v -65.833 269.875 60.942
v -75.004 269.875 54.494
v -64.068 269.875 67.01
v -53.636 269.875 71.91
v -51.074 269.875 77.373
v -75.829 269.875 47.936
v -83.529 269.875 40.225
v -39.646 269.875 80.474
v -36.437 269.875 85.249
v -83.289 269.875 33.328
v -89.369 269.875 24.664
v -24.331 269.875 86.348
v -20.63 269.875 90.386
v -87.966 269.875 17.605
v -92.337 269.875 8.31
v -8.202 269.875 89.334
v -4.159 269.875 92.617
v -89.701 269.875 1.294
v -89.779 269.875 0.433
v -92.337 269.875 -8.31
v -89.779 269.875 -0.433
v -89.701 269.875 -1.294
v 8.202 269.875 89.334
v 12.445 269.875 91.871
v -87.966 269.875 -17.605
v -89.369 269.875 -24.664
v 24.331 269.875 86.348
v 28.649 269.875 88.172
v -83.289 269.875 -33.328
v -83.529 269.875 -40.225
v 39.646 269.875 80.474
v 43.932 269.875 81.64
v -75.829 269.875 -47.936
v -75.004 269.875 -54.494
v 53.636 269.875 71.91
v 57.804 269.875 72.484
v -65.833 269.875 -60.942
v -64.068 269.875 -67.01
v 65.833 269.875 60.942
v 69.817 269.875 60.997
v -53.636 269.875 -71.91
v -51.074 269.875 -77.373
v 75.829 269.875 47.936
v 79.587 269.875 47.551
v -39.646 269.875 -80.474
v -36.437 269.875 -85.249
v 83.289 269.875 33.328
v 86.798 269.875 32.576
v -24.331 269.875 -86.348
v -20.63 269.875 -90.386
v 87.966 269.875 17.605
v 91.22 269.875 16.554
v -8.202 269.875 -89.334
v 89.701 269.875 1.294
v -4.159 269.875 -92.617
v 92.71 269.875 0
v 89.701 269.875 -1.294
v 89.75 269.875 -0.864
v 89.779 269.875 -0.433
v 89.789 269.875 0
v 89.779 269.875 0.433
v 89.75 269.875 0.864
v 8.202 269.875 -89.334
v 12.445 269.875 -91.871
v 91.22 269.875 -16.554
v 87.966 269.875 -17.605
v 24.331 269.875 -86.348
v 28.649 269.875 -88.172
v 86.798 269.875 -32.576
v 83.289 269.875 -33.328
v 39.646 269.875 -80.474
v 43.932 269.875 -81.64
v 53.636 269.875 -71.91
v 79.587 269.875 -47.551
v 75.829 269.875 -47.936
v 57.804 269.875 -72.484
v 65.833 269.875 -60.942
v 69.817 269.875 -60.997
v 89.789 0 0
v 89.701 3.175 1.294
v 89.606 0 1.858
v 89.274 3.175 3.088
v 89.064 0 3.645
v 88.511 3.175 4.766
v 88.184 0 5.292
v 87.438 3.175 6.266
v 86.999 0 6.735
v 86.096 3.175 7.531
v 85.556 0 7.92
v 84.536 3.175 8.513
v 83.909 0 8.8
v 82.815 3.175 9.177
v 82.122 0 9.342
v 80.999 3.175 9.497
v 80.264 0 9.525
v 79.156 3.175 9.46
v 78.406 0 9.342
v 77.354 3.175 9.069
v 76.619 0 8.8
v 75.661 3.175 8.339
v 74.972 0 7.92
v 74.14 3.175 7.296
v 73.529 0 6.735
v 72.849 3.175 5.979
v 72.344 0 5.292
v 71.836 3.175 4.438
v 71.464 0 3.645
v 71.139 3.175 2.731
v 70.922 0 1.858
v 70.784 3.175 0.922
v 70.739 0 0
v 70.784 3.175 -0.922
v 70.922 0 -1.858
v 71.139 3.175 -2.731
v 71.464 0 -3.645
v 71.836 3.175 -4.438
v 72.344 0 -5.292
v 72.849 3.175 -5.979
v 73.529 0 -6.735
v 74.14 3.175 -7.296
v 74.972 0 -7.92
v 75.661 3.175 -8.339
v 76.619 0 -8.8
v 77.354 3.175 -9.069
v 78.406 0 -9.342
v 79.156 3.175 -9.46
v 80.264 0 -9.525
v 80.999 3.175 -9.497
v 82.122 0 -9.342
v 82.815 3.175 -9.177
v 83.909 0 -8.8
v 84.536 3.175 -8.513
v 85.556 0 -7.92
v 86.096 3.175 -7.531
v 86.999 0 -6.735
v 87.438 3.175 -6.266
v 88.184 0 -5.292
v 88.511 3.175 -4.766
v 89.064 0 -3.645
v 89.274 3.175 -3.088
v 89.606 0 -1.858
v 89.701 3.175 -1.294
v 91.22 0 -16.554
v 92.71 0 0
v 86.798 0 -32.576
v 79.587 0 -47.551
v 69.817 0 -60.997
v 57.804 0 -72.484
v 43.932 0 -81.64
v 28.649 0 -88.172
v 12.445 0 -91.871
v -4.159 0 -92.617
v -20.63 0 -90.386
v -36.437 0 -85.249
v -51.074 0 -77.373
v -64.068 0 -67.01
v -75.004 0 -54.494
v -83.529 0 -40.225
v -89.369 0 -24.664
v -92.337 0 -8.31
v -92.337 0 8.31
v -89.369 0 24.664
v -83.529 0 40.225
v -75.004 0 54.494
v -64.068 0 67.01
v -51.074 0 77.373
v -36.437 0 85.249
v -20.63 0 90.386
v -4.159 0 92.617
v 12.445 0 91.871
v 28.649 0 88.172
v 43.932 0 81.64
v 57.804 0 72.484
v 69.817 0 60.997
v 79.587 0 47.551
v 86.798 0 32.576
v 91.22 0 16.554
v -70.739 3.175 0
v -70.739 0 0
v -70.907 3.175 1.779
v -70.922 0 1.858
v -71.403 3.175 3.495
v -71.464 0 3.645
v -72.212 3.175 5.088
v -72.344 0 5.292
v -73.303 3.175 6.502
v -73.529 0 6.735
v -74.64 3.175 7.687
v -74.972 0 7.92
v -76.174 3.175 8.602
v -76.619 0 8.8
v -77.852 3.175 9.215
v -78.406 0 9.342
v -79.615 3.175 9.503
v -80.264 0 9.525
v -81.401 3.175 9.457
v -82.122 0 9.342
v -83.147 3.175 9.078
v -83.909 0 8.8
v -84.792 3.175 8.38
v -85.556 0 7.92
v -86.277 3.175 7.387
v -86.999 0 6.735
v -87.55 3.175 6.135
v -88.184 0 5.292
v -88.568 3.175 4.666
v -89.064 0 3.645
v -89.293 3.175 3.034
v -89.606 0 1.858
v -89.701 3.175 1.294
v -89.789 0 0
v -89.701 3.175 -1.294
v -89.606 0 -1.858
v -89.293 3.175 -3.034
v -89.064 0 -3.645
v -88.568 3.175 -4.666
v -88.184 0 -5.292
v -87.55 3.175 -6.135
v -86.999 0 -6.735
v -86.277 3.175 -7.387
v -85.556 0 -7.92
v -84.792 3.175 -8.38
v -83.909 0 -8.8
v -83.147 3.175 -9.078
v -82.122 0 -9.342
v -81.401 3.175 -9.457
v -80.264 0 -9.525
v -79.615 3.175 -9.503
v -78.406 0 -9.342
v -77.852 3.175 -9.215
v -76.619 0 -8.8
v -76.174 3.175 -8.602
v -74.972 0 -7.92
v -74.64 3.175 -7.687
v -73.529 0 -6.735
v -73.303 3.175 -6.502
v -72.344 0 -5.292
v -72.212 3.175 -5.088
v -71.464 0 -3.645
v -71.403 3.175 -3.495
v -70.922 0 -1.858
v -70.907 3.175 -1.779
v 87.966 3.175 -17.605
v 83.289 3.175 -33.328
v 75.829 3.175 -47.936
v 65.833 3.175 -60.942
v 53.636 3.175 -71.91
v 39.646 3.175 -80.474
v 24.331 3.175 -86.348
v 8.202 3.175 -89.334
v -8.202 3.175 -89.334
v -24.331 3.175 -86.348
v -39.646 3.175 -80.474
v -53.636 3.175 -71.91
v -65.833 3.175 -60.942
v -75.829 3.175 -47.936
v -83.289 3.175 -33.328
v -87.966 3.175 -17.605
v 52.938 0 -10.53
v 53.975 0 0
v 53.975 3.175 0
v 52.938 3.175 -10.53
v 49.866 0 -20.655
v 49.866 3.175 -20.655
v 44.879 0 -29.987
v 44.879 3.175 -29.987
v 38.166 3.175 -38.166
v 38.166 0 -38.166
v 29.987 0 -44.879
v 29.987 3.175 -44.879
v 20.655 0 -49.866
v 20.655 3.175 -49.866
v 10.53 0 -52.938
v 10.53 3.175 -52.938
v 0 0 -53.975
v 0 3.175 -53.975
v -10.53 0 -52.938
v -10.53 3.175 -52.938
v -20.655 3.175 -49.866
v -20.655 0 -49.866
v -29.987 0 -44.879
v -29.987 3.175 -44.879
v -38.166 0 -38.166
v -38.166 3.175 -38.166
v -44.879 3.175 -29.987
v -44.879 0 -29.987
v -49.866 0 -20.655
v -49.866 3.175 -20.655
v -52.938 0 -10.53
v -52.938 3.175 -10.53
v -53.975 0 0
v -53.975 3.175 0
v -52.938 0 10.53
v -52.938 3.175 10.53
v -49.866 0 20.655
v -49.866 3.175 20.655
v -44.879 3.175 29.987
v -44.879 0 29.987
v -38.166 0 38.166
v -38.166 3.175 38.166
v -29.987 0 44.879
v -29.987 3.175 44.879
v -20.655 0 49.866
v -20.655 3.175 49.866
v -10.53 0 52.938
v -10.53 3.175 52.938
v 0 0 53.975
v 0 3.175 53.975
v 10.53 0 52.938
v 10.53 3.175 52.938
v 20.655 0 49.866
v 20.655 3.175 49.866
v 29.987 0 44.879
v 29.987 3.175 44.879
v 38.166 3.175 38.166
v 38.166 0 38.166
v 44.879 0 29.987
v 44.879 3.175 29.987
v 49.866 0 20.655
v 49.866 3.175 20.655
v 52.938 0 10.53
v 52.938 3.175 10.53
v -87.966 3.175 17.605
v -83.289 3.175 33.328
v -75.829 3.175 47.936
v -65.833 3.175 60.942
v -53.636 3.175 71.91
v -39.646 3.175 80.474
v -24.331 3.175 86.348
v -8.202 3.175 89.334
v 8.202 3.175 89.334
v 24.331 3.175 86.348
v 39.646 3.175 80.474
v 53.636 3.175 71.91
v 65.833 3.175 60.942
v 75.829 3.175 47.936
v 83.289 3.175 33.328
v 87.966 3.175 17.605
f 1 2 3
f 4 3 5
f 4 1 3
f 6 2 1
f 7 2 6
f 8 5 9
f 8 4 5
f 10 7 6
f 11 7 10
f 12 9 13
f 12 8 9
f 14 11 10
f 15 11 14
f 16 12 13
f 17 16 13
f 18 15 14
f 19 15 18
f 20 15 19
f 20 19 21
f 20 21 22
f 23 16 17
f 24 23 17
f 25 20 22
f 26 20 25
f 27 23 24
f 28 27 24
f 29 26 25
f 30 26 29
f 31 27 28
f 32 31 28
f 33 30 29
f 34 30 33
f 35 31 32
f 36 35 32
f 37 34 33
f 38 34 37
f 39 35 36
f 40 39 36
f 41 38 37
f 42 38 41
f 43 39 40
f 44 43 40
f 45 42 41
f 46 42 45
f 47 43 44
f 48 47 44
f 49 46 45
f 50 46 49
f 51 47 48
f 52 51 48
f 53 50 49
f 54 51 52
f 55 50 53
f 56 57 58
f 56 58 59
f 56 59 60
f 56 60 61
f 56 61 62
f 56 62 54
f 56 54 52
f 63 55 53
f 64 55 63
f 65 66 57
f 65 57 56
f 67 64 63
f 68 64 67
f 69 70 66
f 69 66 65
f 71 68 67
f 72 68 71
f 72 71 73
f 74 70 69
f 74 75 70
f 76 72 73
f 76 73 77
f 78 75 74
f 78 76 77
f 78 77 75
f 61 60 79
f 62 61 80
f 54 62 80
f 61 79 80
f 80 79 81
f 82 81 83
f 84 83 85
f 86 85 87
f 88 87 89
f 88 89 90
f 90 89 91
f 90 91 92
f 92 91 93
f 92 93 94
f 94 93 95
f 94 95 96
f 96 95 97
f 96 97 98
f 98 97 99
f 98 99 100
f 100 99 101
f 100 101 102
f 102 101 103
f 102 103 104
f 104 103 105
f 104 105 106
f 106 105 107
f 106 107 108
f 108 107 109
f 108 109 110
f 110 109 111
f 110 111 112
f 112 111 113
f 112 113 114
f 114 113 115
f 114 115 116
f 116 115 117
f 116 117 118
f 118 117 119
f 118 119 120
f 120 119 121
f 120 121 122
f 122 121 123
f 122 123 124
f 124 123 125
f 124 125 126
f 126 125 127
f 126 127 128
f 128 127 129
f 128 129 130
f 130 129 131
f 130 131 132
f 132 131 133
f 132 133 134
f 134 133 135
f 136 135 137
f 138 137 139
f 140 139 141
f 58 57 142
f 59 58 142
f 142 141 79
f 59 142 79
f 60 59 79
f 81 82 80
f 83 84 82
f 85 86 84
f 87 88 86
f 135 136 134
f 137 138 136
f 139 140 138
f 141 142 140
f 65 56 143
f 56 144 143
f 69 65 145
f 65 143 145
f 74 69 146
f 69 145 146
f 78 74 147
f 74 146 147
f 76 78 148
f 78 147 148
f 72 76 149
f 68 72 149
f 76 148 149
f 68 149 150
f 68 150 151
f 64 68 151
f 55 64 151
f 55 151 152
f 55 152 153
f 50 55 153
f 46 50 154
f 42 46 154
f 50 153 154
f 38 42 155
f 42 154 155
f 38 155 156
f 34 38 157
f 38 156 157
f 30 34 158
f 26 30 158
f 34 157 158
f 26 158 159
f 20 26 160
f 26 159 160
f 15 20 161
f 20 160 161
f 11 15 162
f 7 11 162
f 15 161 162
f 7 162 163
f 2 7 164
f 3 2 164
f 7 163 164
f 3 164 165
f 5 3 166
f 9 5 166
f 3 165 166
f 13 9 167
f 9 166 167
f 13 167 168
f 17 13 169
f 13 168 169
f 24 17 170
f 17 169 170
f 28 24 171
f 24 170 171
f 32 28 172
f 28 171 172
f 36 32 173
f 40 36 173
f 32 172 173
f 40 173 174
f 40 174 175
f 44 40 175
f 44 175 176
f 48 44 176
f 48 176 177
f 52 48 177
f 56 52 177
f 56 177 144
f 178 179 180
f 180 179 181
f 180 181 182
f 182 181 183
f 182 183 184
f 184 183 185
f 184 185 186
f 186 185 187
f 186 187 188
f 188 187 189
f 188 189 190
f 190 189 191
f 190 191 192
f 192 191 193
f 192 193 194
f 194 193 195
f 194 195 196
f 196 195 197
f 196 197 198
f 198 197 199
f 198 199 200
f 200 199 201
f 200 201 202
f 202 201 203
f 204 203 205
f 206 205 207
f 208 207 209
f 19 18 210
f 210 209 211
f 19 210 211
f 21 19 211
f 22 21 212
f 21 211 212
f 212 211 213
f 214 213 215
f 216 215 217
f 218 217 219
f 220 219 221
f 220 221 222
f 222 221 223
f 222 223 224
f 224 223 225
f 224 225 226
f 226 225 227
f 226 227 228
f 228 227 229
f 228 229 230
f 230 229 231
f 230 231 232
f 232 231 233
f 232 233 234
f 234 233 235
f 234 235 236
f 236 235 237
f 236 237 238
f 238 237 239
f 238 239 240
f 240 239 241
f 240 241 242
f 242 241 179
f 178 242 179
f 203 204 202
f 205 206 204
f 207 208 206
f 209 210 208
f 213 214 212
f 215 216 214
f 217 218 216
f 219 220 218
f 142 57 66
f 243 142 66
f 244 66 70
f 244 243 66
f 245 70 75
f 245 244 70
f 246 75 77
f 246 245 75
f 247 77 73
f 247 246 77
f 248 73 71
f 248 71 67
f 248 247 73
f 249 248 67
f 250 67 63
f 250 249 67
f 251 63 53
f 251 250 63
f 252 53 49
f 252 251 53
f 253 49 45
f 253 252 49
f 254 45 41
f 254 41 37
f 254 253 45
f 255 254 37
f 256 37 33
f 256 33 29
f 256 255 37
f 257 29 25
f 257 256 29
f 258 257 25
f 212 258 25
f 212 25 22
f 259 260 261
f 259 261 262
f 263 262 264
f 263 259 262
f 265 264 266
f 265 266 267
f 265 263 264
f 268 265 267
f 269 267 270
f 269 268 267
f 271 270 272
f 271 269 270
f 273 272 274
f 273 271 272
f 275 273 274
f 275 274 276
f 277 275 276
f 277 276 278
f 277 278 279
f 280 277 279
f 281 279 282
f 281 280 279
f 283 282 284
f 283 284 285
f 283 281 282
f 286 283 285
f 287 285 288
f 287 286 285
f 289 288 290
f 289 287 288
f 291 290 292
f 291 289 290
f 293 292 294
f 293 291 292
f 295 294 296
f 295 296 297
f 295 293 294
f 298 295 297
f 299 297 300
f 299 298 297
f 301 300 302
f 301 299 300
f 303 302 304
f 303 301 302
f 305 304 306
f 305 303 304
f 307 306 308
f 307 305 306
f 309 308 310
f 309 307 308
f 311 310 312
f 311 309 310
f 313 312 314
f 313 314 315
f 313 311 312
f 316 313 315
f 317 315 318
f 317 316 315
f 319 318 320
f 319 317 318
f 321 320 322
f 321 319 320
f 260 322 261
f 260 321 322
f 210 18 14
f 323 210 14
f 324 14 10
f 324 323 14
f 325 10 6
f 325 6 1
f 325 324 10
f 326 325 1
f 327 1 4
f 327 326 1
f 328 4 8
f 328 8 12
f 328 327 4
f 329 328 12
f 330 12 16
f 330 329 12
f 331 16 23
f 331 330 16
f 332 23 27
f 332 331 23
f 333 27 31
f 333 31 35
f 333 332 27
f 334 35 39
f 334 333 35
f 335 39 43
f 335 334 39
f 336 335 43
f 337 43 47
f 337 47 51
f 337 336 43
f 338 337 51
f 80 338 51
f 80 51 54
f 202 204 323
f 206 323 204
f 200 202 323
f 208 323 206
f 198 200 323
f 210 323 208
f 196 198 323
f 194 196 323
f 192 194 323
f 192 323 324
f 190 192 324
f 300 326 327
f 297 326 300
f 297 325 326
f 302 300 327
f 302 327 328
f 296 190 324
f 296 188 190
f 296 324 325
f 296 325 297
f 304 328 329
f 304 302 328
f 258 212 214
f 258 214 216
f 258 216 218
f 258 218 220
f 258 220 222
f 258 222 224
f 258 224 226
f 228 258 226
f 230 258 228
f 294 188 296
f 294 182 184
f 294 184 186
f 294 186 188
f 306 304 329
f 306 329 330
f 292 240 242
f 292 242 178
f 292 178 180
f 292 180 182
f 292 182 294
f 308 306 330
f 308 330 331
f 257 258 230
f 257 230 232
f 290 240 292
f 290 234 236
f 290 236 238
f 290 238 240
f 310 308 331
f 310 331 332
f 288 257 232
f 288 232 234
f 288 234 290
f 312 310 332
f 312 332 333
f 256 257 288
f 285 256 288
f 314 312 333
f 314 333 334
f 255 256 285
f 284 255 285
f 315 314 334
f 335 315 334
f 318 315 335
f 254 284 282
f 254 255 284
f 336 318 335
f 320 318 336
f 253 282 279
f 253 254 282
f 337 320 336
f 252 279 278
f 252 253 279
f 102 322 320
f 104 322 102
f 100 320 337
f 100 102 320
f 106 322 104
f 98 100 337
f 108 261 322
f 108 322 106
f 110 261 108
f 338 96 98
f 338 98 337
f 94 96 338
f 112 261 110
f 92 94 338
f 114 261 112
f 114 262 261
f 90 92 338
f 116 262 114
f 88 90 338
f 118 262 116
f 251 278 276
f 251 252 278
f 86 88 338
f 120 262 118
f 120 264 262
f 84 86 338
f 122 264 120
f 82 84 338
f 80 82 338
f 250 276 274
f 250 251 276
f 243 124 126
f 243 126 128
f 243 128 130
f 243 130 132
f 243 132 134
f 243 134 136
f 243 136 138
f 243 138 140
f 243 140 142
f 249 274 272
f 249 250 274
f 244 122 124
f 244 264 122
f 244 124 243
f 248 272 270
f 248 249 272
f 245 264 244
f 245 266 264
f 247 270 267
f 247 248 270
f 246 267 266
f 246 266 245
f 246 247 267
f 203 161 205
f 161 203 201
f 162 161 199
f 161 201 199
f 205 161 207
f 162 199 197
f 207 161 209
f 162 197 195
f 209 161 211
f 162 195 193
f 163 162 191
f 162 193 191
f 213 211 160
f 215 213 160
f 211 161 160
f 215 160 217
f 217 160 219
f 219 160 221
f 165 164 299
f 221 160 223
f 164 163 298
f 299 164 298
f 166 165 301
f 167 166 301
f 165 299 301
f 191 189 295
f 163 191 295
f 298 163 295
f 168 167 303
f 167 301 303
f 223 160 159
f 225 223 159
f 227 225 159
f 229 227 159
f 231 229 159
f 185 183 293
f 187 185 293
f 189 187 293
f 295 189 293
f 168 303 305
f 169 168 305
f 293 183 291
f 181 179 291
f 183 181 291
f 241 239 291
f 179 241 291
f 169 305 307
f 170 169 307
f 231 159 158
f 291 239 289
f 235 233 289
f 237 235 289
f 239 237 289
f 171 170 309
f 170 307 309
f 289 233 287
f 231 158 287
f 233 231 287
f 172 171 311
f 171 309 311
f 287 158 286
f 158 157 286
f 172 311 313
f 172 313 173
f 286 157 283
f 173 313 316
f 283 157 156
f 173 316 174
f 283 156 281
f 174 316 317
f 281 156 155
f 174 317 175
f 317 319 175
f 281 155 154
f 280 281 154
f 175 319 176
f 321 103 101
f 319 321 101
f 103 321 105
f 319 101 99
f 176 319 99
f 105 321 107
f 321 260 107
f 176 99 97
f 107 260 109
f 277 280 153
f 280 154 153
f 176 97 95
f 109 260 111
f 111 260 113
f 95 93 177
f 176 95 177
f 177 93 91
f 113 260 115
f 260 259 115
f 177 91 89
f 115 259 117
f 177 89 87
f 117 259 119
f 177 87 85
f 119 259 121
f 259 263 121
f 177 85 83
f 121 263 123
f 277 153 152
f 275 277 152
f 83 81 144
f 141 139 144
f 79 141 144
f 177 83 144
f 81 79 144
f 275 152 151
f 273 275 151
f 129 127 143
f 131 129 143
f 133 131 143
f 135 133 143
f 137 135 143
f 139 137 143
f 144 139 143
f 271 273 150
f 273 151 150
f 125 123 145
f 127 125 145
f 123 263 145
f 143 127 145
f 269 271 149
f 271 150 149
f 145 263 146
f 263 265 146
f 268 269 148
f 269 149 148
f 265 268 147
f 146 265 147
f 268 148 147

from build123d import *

# Parameters (mm, degrees)
SKETCH1_R           = 92.71
SKETCH1_R_2         = 53.975
BOSS_EXTRUDE1_DEPTH = 3.175
SKETCH2_R           = 92.71
SKETCH2_R_2         = 89.71
BOSS_EXTRUDE2_DEPTH = 266.7
SKETCH3_R           = 9.525
CUT_EXTRUDE1_DEPTH  = 270.875


with BuildPart() as part:
    # Sketch1 → Boss-Extrude1 (new body)
    with BuildSketch(Plane(origin=(0, 0, 0), x_dir=(1, 0, 0), z_dir=(0, 1, 0))):
        Circle(SKETCH1_R)
        Circle(SKETCH1_R_2, mode=Mode.SUBTRACT)
    extrude(amount=BOSS_EXTRUDE1_DEPTH)

    # Sketch2 → Boss-Extrude2 (add)
    with BuildSketch(Plane(origin=(0, 3.175, 0), x_dir=(1, 0, 0), z_dir=(0, 1, 0))):
        Circle(SKETCH2_R)
        Circle(SKETCH2_R_2, mode=Mode.SUBTRACT)
    extrude(amount=BOSS_EXTRUDE2_DEPTH)

    # Sketch3 → Cut-Extrude1 (cut, through all)
    with BuildSketch(Plane.XZ):
        with Locations((-80.264, 0)):
            Circle(SKETCH3_R)
        with Locations((80.264, 0)):
            Circle(SKETCH3_R)
    extrude(amount=-CUT_EXTRUDE1_DEPTH, mode=Mode.SUBTRACT)


solid = part.part
